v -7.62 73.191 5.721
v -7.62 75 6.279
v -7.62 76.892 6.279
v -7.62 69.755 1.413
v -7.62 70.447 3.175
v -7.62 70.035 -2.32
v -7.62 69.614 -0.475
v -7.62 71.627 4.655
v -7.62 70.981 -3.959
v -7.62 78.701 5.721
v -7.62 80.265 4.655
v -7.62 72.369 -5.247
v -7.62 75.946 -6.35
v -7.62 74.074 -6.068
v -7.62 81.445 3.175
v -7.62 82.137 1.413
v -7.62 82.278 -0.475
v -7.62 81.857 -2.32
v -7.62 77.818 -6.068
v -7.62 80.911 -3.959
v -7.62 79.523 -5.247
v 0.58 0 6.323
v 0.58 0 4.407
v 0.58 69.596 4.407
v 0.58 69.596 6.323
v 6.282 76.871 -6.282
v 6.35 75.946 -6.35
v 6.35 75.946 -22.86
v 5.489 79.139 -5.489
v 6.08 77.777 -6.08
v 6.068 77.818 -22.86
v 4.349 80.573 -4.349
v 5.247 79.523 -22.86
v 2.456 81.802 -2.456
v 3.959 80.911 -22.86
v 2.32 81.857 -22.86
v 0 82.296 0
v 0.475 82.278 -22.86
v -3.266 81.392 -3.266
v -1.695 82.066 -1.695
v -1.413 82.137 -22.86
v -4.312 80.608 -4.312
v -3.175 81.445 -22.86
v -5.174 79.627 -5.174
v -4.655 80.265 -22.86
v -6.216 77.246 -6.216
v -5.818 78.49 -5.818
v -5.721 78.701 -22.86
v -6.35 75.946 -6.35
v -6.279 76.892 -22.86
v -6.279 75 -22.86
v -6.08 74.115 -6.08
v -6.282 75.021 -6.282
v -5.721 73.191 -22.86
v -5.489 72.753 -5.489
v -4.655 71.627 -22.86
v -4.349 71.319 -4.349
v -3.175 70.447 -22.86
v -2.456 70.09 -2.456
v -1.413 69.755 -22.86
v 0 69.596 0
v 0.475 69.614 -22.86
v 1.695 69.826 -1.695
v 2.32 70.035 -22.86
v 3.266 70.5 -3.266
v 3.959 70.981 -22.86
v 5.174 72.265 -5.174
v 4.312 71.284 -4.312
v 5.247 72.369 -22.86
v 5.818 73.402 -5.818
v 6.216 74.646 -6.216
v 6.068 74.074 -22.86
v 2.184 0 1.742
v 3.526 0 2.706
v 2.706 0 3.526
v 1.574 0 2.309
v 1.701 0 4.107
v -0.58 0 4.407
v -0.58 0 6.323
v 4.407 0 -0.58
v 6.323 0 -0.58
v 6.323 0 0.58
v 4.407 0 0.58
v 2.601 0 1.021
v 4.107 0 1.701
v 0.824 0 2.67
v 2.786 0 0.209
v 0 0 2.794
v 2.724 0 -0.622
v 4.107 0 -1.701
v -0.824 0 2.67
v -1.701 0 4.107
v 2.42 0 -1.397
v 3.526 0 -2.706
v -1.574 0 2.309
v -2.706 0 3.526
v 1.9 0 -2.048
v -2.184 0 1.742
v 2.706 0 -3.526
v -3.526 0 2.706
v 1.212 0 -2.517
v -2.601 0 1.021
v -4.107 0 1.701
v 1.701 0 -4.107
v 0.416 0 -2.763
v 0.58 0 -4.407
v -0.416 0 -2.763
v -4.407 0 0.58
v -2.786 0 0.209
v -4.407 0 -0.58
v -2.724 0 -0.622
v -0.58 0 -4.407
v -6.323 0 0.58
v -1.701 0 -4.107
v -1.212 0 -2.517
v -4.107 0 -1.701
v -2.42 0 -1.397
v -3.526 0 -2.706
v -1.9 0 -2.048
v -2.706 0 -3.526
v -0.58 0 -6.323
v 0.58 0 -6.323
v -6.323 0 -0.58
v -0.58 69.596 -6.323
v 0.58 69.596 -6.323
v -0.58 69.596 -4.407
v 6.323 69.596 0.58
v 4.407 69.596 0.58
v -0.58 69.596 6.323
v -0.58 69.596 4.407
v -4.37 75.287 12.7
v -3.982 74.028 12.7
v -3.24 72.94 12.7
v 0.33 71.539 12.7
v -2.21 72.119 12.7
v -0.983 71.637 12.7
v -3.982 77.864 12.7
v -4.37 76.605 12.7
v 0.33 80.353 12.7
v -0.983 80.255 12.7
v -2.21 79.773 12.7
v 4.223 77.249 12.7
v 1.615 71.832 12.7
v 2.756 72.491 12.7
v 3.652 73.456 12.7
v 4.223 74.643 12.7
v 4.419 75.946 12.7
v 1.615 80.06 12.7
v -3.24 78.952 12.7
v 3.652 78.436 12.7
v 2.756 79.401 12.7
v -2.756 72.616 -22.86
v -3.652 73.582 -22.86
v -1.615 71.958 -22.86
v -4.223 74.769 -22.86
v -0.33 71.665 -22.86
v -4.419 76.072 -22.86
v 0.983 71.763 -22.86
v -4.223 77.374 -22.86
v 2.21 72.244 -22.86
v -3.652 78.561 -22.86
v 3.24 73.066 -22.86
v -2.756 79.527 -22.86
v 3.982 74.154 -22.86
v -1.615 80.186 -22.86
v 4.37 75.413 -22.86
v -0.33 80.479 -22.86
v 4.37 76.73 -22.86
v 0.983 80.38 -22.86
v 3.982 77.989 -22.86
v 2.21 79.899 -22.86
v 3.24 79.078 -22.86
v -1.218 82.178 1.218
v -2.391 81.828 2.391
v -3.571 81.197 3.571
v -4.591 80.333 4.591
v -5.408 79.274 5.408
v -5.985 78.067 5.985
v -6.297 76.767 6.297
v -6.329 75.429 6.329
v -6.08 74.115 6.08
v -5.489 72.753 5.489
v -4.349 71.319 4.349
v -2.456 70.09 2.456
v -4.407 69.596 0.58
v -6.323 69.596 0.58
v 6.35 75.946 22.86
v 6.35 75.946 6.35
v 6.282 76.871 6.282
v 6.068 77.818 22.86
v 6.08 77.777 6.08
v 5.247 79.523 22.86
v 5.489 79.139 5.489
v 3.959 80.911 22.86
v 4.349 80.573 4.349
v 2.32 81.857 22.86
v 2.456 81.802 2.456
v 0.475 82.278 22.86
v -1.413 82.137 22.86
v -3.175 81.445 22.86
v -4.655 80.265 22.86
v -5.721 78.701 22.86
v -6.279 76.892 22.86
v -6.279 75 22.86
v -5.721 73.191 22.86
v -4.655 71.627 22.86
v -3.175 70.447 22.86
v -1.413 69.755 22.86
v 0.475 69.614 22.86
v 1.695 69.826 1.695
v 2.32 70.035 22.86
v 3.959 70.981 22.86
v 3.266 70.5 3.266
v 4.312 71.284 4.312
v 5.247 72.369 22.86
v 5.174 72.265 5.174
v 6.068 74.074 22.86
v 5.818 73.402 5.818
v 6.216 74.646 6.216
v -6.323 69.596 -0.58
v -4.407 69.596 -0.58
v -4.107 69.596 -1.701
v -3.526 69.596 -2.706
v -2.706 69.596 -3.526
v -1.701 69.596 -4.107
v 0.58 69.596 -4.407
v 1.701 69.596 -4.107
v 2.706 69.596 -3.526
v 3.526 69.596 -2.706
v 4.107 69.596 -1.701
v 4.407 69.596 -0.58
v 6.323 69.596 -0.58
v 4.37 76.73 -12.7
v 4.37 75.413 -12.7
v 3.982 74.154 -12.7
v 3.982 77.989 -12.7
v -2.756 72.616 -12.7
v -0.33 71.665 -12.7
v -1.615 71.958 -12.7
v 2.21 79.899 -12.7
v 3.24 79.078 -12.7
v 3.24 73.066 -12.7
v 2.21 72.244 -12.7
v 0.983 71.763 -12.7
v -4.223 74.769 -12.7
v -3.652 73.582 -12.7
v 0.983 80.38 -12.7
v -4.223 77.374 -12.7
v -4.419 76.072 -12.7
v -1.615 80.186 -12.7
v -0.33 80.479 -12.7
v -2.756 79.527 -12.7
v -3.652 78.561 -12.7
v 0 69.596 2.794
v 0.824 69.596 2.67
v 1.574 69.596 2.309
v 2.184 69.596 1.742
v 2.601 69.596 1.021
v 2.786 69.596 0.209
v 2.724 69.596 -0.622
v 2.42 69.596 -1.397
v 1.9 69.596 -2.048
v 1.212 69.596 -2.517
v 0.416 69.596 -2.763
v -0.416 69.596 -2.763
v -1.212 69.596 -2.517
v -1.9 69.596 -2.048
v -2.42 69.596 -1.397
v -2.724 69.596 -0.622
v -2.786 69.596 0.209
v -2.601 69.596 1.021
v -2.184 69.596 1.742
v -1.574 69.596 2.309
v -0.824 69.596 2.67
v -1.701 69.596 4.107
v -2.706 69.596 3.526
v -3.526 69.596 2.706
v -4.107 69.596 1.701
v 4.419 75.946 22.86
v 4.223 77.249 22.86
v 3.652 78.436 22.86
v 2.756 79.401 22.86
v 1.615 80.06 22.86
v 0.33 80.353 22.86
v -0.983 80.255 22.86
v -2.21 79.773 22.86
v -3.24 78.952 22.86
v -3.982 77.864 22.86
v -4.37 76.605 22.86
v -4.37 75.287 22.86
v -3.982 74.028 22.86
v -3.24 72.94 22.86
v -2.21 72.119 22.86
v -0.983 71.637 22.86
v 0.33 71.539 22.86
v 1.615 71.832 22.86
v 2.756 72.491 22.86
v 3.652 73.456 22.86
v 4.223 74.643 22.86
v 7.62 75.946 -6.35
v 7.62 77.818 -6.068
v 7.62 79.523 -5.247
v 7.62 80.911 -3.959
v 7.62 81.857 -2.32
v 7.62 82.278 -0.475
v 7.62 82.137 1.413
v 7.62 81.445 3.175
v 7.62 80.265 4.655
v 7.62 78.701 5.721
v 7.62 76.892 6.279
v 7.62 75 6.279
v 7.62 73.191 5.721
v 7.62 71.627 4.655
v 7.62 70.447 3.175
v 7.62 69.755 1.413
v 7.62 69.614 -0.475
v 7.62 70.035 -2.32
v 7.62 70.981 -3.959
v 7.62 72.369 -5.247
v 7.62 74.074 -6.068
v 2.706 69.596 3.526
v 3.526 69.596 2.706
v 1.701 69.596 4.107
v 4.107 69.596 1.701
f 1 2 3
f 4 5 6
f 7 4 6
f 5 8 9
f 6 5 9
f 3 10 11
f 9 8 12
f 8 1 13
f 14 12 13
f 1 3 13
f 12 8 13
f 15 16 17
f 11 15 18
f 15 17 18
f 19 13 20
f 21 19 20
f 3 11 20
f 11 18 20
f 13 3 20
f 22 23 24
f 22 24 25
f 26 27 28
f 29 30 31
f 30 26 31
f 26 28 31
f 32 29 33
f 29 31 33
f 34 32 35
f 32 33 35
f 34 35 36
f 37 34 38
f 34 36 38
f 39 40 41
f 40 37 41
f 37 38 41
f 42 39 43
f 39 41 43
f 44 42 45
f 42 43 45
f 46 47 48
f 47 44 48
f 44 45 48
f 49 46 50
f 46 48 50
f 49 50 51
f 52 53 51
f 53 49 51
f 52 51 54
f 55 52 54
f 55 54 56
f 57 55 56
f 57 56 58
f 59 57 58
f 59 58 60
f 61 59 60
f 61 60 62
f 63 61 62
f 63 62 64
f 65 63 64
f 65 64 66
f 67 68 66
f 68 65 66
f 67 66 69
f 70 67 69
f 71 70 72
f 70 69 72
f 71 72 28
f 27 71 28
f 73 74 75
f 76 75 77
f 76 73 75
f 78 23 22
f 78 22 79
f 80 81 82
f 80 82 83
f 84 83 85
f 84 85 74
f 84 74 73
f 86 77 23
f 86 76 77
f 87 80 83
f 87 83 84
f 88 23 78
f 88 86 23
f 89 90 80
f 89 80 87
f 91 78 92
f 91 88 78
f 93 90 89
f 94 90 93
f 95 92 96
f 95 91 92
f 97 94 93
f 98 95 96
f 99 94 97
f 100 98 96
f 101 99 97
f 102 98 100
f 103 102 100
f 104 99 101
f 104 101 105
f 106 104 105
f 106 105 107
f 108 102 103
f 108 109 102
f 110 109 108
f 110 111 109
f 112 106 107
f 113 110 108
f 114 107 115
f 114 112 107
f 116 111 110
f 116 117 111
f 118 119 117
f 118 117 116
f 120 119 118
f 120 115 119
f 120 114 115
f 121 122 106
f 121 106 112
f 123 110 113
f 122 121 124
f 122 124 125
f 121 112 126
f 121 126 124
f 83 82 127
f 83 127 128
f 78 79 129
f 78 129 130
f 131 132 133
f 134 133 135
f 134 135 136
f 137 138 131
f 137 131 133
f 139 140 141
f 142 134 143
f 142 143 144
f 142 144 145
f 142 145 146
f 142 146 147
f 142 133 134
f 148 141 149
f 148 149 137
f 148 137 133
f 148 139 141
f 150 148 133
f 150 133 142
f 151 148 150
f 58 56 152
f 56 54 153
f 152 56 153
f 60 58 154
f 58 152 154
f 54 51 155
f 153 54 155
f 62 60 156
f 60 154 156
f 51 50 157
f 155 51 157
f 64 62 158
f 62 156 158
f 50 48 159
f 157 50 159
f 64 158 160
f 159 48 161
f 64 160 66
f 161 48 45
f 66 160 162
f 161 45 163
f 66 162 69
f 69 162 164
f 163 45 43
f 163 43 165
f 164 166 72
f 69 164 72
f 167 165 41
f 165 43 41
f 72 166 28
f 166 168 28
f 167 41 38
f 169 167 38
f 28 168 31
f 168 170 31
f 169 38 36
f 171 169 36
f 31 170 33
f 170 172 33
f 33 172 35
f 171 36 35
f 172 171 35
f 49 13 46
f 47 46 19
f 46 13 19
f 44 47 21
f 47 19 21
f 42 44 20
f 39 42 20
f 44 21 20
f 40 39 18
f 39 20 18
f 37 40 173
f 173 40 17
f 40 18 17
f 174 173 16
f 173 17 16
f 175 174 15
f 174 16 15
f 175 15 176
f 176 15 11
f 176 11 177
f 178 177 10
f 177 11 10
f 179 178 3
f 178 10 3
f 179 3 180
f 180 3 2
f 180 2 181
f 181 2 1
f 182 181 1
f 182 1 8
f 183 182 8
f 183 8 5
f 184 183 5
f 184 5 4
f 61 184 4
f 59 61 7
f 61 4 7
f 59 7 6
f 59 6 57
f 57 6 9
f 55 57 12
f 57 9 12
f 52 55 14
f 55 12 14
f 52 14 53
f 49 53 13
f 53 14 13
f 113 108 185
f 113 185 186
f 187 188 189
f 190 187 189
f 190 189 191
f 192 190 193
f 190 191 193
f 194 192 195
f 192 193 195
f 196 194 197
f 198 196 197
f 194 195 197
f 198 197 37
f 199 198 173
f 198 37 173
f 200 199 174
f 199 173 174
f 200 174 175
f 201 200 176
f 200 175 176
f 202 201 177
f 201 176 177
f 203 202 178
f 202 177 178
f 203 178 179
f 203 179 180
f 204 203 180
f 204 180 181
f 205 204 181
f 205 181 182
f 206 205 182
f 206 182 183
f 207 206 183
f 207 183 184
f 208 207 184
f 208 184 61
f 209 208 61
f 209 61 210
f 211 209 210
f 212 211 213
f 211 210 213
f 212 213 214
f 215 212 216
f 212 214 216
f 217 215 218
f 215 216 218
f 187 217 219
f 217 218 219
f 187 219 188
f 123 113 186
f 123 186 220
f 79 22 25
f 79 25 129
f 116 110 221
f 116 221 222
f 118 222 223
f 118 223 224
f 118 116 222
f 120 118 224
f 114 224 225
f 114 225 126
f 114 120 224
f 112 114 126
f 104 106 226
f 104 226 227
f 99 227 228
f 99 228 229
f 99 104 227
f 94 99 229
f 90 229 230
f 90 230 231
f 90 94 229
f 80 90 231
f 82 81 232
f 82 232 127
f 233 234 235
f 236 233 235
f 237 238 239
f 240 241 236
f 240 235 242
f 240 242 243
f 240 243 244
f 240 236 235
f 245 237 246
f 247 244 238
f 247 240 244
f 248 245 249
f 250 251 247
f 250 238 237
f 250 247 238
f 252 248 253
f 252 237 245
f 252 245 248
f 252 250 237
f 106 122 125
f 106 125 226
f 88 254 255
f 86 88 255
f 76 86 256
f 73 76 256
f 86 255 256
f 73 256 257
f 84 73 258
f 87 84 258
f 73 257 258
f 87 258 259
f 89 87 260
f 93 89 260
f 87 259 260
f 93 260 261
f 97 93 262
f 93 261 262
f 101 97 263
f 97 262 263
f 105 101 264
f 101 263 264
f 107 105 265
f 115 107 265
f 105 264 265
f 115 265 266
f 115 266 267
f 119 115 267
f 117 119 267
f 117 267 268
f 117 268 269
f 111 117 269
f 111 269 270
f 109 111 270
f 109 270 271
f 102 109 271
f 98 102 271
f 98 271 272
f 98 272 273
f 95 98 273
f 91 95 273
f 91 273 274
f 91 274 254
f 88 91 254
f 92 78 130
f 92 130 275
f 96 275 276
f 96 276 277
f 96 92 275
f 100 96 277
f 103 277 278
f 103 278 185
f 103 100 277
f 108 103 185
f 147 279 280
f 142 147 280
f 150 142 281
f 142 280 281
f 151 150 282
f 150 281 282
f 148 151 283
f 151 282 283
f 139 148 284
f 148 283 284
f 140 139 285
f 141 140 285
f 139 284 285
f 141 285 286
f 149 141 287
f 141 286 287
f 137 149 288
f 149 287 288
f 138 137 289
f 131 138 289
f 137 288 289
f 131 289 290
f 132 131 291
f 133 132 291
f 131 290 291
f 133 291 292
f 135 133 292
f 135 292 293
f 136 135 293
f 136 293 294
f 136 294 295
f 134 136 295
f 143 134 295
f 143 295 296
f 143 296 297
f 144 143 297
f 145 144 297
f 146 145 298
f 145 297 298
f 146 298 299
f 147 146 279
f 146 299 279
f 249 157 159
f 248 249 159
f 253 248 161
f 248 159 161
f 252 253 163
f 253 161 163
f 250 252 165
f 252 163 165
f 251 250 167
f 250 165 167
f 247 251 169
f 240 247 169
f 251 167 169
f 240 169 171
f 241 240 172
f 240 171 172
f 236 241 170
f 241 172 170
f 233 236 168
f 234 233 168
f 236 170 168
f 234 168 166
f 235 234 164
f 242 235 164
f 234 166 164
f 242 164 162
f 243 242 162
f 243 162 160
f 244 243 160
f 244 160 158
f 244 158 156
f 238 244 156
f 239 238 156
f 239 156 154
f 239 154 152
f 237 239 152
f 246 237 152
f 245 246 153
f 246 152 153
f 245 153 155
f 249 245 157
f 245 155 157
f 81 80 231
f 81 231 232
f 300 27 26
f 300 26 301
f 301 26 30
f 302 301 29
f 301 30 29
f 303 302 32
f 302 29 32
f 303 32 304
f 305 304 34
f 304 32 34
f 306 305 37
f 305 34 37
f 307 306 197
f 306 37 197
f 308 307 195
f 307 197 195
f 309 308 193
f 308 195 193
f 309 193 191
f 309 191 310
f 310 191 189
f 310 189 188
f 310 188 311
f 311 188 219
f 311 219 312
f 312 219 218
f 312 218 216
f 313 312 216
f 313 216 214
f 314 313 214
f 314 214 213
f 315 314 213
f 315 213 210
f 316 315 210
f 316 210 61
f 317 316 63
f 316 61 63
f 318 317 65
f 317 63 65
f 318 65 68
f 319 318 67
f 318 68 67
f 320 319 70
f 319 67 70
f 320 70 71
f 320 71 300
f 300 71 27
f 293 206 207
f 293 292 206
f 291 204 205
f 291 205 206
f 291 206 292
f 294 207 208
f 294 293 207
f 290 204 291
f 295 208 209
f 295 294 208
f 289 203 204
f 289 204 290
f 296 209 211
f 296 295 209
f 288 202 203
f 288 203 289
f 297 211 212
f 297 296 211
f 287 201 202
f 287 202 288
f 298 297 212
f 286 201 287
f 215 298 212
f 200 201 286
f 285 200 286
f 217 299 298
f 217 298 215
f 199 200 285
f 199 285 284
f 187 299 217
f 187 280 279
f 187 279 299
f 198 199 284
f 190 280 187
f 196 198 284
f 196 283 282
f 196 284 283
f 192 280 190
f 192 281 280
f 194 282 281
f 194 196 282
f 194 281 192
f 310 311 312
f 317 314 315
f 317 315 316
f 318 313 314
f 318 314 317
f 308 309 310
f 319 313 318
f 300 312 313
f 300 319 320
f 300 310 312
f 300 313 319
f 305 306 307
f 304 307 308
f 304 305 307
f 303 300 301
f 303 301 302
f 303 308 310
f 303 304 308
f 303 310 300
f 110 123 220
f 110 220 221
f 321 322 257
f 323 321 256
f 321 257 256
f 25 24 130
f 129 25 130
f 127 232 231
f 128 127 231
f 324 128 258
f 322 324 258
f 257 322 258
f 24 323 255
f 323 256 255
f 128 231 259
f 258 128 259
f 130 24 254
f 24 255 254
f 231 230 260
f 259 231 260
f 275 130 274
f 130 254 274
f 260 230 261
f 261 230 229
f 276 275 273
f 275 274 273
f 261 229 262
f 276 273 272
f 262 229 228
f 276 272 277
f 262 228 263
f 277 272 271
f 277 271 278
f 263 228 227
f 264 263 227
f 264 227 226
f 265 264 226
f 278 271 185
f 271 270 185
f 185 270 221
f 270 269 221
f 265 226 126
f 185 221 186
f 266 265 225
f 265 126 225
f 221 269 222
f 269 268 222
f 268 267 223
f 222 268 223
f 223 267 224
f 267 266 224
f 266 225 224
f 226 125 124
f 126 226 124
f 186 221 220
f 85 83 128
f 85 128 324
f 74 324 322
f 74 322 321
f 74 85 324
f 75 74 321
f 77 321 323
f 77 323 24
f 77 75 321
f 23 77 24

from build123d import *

# Parameters (mm, degrees)
BOSS_EXTRUDE2_DEPTH      = 69.596
SKETCH4_R                = 2.794
CUT_EXTRUDE1_DEPTH       = 71.16819064
BOSS_EXTRUDE3_DEPTH      = 22.86
BOSS_EXTRUDE3_DEPTH_BACK = 22.86
SKETCH5_R                = 6.35
SKETCH6_R                = 3.738220815
CUT_EXTRUDE3_DEPTH       = 12.7
BOSS_EXTRUDE4_DEPTH      = 7.62
BOSS_EXTRUDE4_DEPTH_BACK = 7.62
SKETCH7_R                = 6.35
SKETCH8_R                = 4.419485512
CUT_EXTRUDE4_DEPTH       = 10.16
SKETCH9_R                = 4.419485573
CUT_EXTRUDE5_DEPTH       = 10.16


with BuildPart() as part:
    # Sketch3 → Boss-Extrude2 (new body)
    with BuildSketch(Plane(origin=(0, 0, 0), x_dir=(1, 0, 0), z_dir=(0, 1, 0))):
        with BuildLine():
            Line((-0.580188924, 4.406972409), (-0.580188924, 6.323439002))
            Line((-0.580188924, 6.323439002), (0.580188924, 6.323439002))
            Line((0.580188924, 6.323439002), (0.580188924, 4.406972409))
            ThreePointArc((0.580188924, 4.406972409), (3.143089642, 3.143089642), (4.406972409, 0.580188924))
            Line((4.406972409, 0.580188924), (6.323439002, 0.580188924))
            Line((6.323439002, 0.580188924), (6.323439002, -0.580188924))
            Line((6.323439002, -0.580188924), (4.406972409, -0.580188924))
            ThreePointArc((4.406972409, -0.580188924), (3.143089642, -3.143089642), (0.580188924, -4.406972409))
            Line((0.580188924, -4.406972409), (0.580188924, -6.323439002))
            Line((0.580188924, -6.323439002), (-0.580188924, -6.323439002))
            Line((-0.580188924, -6.323439002), (-0.580188924, -4.406972409))
            ThreePointArc((-0.580188924, -4.406972409), (-3.143089642, -3.143089642), (-4.406972409, -0.580188924))
            Line((-4.406972409, -0.580188924), (-6.323439002, -0.580188924))
            Line((-6.323439002, -0.580188924), (-6.323439002, 0.580188924))
            Line((-6.323439002, 0.580188924), (-4.406972409, 0.580188924))
            ThreePointArc((-4.406972409, 0.580188924), (-3.143089642, 3.143089642), (-0.580188924, 4.406972409))
        make_face()
    extrude(amount=BOSS_EXTRUDE2_DEPTH)

    # Sketch4 → Cut-Extrude1 (cut, through all)
    with BuildSketch(Plane(origin=(0, 69.596, 0), x_dir=(1, 0, 0), z_dir=(0, 1, 0))):
        with Locations(Location((0, 0, 0), (0, 0, 270))):
            Circle(SKETCH4_R)
    extrude(amount=-CUT_EXTRUDE1_DEPTH, mode=Mode.SUBTRACT)


with BuildPart() as body_2:
    # Sketch5 → Boss-Extrude3 (new, two sides: drawn at the far end of the back side and taken through both)
    with BuildSketch(Plane.XY.offset(-BOSS_EXTRUDE3_DEPTH_BACK)):
        with Locations((0, 75.946)):
            Circle(SKETCH5_R)
    extrude(amount=BOSS_EXTRUDE3_DEPTH + BOSS_EXTRUDE3_DEPTH_BACK)


with BuildPart() as body_3:
    # Mirror1: mirrored copy
    add(body_2.part.mirror(Plane.XY))


with BuildPart() as cut_extrude3_tool:
    # Sketch6 → Cut-Extrude3 (new body)
    with BuildSketch(Plane.XY.offset(22.86)):
        with Locations((0, 75.946)):
            Circle(SKETCH6_R)
    extrude(amount=-CUT_EXTRUDE3_DEPTH)


with BuildPart() as body_2_1:
    add(body_2.part)

    # Cut-Extrude3: cut by cut_extrude3_tool
    add(cut_extrude3_tool.part, mode=Mode.SUBTRACT)


with BuildPart() as body_3_1:
    add(body_3.part)

    # Cut-Extrude3: cut by cut_extrude3_tool
    add(cut_extrude3_tool.part, mode=Mode.SUBTRACT)


with BuildPart() as body_4:
    # Mirror2: mirrored copy
    add(body_2_1.part.mirror(Plane.XY))


with BuildPart() as body_2_2:
    add(body_2_1.part)

    add(body_3_1.part)  # Boss-Extrude4 merges body 3

    add(body_4.part)  # Boss-Extrude4 merges body 4
    # Sketch7 → Boss-Extrude4 (add, two sides: drawn at the far end of the back side and taken through both)
    with BuildSketch(Plane(origin=(0, 0, 0), x_dir=(0, 0, -1), z_dir=(1, 0, 0)).offset(-BOSS_EXTRUDE4_DEPTH_BACK)):
        with Locations((0, 75.946)):
            Circle(SKETCH7_R)
    extrude(amount=BOSS_EXTRUDE4_DEPTH + BOSS_EXTRUDE4_DEPTH_BACK)

    # Sketch8 → Cut-Extrude4 (cut)
    with BuildSketch(Plane.XY.offset(22.86)):
        with Locations((0, 75.946)):
            Circle(SKETCH8_R)
    extrude(amount=-CUT_EXTRUDE4_DEPTH, mode=Mode.SUBTRACT)

    # Sketch9 → Cut-Extrude5 (cut)
    with BuildSketch(Plane(origin=(0, 0, -22.86), x_dir=(-1, 0, 0), z_dir=(0, 0, -1))):
        with Locations((0, 76.071629016)):
            Circle(SKETCH9_R)
    extrude(amount=-CUT_EXTRUDE5_DEPTH, mode=Mode.SUBTRACT)


solid = Compound([part.part, body_2_2.part])
